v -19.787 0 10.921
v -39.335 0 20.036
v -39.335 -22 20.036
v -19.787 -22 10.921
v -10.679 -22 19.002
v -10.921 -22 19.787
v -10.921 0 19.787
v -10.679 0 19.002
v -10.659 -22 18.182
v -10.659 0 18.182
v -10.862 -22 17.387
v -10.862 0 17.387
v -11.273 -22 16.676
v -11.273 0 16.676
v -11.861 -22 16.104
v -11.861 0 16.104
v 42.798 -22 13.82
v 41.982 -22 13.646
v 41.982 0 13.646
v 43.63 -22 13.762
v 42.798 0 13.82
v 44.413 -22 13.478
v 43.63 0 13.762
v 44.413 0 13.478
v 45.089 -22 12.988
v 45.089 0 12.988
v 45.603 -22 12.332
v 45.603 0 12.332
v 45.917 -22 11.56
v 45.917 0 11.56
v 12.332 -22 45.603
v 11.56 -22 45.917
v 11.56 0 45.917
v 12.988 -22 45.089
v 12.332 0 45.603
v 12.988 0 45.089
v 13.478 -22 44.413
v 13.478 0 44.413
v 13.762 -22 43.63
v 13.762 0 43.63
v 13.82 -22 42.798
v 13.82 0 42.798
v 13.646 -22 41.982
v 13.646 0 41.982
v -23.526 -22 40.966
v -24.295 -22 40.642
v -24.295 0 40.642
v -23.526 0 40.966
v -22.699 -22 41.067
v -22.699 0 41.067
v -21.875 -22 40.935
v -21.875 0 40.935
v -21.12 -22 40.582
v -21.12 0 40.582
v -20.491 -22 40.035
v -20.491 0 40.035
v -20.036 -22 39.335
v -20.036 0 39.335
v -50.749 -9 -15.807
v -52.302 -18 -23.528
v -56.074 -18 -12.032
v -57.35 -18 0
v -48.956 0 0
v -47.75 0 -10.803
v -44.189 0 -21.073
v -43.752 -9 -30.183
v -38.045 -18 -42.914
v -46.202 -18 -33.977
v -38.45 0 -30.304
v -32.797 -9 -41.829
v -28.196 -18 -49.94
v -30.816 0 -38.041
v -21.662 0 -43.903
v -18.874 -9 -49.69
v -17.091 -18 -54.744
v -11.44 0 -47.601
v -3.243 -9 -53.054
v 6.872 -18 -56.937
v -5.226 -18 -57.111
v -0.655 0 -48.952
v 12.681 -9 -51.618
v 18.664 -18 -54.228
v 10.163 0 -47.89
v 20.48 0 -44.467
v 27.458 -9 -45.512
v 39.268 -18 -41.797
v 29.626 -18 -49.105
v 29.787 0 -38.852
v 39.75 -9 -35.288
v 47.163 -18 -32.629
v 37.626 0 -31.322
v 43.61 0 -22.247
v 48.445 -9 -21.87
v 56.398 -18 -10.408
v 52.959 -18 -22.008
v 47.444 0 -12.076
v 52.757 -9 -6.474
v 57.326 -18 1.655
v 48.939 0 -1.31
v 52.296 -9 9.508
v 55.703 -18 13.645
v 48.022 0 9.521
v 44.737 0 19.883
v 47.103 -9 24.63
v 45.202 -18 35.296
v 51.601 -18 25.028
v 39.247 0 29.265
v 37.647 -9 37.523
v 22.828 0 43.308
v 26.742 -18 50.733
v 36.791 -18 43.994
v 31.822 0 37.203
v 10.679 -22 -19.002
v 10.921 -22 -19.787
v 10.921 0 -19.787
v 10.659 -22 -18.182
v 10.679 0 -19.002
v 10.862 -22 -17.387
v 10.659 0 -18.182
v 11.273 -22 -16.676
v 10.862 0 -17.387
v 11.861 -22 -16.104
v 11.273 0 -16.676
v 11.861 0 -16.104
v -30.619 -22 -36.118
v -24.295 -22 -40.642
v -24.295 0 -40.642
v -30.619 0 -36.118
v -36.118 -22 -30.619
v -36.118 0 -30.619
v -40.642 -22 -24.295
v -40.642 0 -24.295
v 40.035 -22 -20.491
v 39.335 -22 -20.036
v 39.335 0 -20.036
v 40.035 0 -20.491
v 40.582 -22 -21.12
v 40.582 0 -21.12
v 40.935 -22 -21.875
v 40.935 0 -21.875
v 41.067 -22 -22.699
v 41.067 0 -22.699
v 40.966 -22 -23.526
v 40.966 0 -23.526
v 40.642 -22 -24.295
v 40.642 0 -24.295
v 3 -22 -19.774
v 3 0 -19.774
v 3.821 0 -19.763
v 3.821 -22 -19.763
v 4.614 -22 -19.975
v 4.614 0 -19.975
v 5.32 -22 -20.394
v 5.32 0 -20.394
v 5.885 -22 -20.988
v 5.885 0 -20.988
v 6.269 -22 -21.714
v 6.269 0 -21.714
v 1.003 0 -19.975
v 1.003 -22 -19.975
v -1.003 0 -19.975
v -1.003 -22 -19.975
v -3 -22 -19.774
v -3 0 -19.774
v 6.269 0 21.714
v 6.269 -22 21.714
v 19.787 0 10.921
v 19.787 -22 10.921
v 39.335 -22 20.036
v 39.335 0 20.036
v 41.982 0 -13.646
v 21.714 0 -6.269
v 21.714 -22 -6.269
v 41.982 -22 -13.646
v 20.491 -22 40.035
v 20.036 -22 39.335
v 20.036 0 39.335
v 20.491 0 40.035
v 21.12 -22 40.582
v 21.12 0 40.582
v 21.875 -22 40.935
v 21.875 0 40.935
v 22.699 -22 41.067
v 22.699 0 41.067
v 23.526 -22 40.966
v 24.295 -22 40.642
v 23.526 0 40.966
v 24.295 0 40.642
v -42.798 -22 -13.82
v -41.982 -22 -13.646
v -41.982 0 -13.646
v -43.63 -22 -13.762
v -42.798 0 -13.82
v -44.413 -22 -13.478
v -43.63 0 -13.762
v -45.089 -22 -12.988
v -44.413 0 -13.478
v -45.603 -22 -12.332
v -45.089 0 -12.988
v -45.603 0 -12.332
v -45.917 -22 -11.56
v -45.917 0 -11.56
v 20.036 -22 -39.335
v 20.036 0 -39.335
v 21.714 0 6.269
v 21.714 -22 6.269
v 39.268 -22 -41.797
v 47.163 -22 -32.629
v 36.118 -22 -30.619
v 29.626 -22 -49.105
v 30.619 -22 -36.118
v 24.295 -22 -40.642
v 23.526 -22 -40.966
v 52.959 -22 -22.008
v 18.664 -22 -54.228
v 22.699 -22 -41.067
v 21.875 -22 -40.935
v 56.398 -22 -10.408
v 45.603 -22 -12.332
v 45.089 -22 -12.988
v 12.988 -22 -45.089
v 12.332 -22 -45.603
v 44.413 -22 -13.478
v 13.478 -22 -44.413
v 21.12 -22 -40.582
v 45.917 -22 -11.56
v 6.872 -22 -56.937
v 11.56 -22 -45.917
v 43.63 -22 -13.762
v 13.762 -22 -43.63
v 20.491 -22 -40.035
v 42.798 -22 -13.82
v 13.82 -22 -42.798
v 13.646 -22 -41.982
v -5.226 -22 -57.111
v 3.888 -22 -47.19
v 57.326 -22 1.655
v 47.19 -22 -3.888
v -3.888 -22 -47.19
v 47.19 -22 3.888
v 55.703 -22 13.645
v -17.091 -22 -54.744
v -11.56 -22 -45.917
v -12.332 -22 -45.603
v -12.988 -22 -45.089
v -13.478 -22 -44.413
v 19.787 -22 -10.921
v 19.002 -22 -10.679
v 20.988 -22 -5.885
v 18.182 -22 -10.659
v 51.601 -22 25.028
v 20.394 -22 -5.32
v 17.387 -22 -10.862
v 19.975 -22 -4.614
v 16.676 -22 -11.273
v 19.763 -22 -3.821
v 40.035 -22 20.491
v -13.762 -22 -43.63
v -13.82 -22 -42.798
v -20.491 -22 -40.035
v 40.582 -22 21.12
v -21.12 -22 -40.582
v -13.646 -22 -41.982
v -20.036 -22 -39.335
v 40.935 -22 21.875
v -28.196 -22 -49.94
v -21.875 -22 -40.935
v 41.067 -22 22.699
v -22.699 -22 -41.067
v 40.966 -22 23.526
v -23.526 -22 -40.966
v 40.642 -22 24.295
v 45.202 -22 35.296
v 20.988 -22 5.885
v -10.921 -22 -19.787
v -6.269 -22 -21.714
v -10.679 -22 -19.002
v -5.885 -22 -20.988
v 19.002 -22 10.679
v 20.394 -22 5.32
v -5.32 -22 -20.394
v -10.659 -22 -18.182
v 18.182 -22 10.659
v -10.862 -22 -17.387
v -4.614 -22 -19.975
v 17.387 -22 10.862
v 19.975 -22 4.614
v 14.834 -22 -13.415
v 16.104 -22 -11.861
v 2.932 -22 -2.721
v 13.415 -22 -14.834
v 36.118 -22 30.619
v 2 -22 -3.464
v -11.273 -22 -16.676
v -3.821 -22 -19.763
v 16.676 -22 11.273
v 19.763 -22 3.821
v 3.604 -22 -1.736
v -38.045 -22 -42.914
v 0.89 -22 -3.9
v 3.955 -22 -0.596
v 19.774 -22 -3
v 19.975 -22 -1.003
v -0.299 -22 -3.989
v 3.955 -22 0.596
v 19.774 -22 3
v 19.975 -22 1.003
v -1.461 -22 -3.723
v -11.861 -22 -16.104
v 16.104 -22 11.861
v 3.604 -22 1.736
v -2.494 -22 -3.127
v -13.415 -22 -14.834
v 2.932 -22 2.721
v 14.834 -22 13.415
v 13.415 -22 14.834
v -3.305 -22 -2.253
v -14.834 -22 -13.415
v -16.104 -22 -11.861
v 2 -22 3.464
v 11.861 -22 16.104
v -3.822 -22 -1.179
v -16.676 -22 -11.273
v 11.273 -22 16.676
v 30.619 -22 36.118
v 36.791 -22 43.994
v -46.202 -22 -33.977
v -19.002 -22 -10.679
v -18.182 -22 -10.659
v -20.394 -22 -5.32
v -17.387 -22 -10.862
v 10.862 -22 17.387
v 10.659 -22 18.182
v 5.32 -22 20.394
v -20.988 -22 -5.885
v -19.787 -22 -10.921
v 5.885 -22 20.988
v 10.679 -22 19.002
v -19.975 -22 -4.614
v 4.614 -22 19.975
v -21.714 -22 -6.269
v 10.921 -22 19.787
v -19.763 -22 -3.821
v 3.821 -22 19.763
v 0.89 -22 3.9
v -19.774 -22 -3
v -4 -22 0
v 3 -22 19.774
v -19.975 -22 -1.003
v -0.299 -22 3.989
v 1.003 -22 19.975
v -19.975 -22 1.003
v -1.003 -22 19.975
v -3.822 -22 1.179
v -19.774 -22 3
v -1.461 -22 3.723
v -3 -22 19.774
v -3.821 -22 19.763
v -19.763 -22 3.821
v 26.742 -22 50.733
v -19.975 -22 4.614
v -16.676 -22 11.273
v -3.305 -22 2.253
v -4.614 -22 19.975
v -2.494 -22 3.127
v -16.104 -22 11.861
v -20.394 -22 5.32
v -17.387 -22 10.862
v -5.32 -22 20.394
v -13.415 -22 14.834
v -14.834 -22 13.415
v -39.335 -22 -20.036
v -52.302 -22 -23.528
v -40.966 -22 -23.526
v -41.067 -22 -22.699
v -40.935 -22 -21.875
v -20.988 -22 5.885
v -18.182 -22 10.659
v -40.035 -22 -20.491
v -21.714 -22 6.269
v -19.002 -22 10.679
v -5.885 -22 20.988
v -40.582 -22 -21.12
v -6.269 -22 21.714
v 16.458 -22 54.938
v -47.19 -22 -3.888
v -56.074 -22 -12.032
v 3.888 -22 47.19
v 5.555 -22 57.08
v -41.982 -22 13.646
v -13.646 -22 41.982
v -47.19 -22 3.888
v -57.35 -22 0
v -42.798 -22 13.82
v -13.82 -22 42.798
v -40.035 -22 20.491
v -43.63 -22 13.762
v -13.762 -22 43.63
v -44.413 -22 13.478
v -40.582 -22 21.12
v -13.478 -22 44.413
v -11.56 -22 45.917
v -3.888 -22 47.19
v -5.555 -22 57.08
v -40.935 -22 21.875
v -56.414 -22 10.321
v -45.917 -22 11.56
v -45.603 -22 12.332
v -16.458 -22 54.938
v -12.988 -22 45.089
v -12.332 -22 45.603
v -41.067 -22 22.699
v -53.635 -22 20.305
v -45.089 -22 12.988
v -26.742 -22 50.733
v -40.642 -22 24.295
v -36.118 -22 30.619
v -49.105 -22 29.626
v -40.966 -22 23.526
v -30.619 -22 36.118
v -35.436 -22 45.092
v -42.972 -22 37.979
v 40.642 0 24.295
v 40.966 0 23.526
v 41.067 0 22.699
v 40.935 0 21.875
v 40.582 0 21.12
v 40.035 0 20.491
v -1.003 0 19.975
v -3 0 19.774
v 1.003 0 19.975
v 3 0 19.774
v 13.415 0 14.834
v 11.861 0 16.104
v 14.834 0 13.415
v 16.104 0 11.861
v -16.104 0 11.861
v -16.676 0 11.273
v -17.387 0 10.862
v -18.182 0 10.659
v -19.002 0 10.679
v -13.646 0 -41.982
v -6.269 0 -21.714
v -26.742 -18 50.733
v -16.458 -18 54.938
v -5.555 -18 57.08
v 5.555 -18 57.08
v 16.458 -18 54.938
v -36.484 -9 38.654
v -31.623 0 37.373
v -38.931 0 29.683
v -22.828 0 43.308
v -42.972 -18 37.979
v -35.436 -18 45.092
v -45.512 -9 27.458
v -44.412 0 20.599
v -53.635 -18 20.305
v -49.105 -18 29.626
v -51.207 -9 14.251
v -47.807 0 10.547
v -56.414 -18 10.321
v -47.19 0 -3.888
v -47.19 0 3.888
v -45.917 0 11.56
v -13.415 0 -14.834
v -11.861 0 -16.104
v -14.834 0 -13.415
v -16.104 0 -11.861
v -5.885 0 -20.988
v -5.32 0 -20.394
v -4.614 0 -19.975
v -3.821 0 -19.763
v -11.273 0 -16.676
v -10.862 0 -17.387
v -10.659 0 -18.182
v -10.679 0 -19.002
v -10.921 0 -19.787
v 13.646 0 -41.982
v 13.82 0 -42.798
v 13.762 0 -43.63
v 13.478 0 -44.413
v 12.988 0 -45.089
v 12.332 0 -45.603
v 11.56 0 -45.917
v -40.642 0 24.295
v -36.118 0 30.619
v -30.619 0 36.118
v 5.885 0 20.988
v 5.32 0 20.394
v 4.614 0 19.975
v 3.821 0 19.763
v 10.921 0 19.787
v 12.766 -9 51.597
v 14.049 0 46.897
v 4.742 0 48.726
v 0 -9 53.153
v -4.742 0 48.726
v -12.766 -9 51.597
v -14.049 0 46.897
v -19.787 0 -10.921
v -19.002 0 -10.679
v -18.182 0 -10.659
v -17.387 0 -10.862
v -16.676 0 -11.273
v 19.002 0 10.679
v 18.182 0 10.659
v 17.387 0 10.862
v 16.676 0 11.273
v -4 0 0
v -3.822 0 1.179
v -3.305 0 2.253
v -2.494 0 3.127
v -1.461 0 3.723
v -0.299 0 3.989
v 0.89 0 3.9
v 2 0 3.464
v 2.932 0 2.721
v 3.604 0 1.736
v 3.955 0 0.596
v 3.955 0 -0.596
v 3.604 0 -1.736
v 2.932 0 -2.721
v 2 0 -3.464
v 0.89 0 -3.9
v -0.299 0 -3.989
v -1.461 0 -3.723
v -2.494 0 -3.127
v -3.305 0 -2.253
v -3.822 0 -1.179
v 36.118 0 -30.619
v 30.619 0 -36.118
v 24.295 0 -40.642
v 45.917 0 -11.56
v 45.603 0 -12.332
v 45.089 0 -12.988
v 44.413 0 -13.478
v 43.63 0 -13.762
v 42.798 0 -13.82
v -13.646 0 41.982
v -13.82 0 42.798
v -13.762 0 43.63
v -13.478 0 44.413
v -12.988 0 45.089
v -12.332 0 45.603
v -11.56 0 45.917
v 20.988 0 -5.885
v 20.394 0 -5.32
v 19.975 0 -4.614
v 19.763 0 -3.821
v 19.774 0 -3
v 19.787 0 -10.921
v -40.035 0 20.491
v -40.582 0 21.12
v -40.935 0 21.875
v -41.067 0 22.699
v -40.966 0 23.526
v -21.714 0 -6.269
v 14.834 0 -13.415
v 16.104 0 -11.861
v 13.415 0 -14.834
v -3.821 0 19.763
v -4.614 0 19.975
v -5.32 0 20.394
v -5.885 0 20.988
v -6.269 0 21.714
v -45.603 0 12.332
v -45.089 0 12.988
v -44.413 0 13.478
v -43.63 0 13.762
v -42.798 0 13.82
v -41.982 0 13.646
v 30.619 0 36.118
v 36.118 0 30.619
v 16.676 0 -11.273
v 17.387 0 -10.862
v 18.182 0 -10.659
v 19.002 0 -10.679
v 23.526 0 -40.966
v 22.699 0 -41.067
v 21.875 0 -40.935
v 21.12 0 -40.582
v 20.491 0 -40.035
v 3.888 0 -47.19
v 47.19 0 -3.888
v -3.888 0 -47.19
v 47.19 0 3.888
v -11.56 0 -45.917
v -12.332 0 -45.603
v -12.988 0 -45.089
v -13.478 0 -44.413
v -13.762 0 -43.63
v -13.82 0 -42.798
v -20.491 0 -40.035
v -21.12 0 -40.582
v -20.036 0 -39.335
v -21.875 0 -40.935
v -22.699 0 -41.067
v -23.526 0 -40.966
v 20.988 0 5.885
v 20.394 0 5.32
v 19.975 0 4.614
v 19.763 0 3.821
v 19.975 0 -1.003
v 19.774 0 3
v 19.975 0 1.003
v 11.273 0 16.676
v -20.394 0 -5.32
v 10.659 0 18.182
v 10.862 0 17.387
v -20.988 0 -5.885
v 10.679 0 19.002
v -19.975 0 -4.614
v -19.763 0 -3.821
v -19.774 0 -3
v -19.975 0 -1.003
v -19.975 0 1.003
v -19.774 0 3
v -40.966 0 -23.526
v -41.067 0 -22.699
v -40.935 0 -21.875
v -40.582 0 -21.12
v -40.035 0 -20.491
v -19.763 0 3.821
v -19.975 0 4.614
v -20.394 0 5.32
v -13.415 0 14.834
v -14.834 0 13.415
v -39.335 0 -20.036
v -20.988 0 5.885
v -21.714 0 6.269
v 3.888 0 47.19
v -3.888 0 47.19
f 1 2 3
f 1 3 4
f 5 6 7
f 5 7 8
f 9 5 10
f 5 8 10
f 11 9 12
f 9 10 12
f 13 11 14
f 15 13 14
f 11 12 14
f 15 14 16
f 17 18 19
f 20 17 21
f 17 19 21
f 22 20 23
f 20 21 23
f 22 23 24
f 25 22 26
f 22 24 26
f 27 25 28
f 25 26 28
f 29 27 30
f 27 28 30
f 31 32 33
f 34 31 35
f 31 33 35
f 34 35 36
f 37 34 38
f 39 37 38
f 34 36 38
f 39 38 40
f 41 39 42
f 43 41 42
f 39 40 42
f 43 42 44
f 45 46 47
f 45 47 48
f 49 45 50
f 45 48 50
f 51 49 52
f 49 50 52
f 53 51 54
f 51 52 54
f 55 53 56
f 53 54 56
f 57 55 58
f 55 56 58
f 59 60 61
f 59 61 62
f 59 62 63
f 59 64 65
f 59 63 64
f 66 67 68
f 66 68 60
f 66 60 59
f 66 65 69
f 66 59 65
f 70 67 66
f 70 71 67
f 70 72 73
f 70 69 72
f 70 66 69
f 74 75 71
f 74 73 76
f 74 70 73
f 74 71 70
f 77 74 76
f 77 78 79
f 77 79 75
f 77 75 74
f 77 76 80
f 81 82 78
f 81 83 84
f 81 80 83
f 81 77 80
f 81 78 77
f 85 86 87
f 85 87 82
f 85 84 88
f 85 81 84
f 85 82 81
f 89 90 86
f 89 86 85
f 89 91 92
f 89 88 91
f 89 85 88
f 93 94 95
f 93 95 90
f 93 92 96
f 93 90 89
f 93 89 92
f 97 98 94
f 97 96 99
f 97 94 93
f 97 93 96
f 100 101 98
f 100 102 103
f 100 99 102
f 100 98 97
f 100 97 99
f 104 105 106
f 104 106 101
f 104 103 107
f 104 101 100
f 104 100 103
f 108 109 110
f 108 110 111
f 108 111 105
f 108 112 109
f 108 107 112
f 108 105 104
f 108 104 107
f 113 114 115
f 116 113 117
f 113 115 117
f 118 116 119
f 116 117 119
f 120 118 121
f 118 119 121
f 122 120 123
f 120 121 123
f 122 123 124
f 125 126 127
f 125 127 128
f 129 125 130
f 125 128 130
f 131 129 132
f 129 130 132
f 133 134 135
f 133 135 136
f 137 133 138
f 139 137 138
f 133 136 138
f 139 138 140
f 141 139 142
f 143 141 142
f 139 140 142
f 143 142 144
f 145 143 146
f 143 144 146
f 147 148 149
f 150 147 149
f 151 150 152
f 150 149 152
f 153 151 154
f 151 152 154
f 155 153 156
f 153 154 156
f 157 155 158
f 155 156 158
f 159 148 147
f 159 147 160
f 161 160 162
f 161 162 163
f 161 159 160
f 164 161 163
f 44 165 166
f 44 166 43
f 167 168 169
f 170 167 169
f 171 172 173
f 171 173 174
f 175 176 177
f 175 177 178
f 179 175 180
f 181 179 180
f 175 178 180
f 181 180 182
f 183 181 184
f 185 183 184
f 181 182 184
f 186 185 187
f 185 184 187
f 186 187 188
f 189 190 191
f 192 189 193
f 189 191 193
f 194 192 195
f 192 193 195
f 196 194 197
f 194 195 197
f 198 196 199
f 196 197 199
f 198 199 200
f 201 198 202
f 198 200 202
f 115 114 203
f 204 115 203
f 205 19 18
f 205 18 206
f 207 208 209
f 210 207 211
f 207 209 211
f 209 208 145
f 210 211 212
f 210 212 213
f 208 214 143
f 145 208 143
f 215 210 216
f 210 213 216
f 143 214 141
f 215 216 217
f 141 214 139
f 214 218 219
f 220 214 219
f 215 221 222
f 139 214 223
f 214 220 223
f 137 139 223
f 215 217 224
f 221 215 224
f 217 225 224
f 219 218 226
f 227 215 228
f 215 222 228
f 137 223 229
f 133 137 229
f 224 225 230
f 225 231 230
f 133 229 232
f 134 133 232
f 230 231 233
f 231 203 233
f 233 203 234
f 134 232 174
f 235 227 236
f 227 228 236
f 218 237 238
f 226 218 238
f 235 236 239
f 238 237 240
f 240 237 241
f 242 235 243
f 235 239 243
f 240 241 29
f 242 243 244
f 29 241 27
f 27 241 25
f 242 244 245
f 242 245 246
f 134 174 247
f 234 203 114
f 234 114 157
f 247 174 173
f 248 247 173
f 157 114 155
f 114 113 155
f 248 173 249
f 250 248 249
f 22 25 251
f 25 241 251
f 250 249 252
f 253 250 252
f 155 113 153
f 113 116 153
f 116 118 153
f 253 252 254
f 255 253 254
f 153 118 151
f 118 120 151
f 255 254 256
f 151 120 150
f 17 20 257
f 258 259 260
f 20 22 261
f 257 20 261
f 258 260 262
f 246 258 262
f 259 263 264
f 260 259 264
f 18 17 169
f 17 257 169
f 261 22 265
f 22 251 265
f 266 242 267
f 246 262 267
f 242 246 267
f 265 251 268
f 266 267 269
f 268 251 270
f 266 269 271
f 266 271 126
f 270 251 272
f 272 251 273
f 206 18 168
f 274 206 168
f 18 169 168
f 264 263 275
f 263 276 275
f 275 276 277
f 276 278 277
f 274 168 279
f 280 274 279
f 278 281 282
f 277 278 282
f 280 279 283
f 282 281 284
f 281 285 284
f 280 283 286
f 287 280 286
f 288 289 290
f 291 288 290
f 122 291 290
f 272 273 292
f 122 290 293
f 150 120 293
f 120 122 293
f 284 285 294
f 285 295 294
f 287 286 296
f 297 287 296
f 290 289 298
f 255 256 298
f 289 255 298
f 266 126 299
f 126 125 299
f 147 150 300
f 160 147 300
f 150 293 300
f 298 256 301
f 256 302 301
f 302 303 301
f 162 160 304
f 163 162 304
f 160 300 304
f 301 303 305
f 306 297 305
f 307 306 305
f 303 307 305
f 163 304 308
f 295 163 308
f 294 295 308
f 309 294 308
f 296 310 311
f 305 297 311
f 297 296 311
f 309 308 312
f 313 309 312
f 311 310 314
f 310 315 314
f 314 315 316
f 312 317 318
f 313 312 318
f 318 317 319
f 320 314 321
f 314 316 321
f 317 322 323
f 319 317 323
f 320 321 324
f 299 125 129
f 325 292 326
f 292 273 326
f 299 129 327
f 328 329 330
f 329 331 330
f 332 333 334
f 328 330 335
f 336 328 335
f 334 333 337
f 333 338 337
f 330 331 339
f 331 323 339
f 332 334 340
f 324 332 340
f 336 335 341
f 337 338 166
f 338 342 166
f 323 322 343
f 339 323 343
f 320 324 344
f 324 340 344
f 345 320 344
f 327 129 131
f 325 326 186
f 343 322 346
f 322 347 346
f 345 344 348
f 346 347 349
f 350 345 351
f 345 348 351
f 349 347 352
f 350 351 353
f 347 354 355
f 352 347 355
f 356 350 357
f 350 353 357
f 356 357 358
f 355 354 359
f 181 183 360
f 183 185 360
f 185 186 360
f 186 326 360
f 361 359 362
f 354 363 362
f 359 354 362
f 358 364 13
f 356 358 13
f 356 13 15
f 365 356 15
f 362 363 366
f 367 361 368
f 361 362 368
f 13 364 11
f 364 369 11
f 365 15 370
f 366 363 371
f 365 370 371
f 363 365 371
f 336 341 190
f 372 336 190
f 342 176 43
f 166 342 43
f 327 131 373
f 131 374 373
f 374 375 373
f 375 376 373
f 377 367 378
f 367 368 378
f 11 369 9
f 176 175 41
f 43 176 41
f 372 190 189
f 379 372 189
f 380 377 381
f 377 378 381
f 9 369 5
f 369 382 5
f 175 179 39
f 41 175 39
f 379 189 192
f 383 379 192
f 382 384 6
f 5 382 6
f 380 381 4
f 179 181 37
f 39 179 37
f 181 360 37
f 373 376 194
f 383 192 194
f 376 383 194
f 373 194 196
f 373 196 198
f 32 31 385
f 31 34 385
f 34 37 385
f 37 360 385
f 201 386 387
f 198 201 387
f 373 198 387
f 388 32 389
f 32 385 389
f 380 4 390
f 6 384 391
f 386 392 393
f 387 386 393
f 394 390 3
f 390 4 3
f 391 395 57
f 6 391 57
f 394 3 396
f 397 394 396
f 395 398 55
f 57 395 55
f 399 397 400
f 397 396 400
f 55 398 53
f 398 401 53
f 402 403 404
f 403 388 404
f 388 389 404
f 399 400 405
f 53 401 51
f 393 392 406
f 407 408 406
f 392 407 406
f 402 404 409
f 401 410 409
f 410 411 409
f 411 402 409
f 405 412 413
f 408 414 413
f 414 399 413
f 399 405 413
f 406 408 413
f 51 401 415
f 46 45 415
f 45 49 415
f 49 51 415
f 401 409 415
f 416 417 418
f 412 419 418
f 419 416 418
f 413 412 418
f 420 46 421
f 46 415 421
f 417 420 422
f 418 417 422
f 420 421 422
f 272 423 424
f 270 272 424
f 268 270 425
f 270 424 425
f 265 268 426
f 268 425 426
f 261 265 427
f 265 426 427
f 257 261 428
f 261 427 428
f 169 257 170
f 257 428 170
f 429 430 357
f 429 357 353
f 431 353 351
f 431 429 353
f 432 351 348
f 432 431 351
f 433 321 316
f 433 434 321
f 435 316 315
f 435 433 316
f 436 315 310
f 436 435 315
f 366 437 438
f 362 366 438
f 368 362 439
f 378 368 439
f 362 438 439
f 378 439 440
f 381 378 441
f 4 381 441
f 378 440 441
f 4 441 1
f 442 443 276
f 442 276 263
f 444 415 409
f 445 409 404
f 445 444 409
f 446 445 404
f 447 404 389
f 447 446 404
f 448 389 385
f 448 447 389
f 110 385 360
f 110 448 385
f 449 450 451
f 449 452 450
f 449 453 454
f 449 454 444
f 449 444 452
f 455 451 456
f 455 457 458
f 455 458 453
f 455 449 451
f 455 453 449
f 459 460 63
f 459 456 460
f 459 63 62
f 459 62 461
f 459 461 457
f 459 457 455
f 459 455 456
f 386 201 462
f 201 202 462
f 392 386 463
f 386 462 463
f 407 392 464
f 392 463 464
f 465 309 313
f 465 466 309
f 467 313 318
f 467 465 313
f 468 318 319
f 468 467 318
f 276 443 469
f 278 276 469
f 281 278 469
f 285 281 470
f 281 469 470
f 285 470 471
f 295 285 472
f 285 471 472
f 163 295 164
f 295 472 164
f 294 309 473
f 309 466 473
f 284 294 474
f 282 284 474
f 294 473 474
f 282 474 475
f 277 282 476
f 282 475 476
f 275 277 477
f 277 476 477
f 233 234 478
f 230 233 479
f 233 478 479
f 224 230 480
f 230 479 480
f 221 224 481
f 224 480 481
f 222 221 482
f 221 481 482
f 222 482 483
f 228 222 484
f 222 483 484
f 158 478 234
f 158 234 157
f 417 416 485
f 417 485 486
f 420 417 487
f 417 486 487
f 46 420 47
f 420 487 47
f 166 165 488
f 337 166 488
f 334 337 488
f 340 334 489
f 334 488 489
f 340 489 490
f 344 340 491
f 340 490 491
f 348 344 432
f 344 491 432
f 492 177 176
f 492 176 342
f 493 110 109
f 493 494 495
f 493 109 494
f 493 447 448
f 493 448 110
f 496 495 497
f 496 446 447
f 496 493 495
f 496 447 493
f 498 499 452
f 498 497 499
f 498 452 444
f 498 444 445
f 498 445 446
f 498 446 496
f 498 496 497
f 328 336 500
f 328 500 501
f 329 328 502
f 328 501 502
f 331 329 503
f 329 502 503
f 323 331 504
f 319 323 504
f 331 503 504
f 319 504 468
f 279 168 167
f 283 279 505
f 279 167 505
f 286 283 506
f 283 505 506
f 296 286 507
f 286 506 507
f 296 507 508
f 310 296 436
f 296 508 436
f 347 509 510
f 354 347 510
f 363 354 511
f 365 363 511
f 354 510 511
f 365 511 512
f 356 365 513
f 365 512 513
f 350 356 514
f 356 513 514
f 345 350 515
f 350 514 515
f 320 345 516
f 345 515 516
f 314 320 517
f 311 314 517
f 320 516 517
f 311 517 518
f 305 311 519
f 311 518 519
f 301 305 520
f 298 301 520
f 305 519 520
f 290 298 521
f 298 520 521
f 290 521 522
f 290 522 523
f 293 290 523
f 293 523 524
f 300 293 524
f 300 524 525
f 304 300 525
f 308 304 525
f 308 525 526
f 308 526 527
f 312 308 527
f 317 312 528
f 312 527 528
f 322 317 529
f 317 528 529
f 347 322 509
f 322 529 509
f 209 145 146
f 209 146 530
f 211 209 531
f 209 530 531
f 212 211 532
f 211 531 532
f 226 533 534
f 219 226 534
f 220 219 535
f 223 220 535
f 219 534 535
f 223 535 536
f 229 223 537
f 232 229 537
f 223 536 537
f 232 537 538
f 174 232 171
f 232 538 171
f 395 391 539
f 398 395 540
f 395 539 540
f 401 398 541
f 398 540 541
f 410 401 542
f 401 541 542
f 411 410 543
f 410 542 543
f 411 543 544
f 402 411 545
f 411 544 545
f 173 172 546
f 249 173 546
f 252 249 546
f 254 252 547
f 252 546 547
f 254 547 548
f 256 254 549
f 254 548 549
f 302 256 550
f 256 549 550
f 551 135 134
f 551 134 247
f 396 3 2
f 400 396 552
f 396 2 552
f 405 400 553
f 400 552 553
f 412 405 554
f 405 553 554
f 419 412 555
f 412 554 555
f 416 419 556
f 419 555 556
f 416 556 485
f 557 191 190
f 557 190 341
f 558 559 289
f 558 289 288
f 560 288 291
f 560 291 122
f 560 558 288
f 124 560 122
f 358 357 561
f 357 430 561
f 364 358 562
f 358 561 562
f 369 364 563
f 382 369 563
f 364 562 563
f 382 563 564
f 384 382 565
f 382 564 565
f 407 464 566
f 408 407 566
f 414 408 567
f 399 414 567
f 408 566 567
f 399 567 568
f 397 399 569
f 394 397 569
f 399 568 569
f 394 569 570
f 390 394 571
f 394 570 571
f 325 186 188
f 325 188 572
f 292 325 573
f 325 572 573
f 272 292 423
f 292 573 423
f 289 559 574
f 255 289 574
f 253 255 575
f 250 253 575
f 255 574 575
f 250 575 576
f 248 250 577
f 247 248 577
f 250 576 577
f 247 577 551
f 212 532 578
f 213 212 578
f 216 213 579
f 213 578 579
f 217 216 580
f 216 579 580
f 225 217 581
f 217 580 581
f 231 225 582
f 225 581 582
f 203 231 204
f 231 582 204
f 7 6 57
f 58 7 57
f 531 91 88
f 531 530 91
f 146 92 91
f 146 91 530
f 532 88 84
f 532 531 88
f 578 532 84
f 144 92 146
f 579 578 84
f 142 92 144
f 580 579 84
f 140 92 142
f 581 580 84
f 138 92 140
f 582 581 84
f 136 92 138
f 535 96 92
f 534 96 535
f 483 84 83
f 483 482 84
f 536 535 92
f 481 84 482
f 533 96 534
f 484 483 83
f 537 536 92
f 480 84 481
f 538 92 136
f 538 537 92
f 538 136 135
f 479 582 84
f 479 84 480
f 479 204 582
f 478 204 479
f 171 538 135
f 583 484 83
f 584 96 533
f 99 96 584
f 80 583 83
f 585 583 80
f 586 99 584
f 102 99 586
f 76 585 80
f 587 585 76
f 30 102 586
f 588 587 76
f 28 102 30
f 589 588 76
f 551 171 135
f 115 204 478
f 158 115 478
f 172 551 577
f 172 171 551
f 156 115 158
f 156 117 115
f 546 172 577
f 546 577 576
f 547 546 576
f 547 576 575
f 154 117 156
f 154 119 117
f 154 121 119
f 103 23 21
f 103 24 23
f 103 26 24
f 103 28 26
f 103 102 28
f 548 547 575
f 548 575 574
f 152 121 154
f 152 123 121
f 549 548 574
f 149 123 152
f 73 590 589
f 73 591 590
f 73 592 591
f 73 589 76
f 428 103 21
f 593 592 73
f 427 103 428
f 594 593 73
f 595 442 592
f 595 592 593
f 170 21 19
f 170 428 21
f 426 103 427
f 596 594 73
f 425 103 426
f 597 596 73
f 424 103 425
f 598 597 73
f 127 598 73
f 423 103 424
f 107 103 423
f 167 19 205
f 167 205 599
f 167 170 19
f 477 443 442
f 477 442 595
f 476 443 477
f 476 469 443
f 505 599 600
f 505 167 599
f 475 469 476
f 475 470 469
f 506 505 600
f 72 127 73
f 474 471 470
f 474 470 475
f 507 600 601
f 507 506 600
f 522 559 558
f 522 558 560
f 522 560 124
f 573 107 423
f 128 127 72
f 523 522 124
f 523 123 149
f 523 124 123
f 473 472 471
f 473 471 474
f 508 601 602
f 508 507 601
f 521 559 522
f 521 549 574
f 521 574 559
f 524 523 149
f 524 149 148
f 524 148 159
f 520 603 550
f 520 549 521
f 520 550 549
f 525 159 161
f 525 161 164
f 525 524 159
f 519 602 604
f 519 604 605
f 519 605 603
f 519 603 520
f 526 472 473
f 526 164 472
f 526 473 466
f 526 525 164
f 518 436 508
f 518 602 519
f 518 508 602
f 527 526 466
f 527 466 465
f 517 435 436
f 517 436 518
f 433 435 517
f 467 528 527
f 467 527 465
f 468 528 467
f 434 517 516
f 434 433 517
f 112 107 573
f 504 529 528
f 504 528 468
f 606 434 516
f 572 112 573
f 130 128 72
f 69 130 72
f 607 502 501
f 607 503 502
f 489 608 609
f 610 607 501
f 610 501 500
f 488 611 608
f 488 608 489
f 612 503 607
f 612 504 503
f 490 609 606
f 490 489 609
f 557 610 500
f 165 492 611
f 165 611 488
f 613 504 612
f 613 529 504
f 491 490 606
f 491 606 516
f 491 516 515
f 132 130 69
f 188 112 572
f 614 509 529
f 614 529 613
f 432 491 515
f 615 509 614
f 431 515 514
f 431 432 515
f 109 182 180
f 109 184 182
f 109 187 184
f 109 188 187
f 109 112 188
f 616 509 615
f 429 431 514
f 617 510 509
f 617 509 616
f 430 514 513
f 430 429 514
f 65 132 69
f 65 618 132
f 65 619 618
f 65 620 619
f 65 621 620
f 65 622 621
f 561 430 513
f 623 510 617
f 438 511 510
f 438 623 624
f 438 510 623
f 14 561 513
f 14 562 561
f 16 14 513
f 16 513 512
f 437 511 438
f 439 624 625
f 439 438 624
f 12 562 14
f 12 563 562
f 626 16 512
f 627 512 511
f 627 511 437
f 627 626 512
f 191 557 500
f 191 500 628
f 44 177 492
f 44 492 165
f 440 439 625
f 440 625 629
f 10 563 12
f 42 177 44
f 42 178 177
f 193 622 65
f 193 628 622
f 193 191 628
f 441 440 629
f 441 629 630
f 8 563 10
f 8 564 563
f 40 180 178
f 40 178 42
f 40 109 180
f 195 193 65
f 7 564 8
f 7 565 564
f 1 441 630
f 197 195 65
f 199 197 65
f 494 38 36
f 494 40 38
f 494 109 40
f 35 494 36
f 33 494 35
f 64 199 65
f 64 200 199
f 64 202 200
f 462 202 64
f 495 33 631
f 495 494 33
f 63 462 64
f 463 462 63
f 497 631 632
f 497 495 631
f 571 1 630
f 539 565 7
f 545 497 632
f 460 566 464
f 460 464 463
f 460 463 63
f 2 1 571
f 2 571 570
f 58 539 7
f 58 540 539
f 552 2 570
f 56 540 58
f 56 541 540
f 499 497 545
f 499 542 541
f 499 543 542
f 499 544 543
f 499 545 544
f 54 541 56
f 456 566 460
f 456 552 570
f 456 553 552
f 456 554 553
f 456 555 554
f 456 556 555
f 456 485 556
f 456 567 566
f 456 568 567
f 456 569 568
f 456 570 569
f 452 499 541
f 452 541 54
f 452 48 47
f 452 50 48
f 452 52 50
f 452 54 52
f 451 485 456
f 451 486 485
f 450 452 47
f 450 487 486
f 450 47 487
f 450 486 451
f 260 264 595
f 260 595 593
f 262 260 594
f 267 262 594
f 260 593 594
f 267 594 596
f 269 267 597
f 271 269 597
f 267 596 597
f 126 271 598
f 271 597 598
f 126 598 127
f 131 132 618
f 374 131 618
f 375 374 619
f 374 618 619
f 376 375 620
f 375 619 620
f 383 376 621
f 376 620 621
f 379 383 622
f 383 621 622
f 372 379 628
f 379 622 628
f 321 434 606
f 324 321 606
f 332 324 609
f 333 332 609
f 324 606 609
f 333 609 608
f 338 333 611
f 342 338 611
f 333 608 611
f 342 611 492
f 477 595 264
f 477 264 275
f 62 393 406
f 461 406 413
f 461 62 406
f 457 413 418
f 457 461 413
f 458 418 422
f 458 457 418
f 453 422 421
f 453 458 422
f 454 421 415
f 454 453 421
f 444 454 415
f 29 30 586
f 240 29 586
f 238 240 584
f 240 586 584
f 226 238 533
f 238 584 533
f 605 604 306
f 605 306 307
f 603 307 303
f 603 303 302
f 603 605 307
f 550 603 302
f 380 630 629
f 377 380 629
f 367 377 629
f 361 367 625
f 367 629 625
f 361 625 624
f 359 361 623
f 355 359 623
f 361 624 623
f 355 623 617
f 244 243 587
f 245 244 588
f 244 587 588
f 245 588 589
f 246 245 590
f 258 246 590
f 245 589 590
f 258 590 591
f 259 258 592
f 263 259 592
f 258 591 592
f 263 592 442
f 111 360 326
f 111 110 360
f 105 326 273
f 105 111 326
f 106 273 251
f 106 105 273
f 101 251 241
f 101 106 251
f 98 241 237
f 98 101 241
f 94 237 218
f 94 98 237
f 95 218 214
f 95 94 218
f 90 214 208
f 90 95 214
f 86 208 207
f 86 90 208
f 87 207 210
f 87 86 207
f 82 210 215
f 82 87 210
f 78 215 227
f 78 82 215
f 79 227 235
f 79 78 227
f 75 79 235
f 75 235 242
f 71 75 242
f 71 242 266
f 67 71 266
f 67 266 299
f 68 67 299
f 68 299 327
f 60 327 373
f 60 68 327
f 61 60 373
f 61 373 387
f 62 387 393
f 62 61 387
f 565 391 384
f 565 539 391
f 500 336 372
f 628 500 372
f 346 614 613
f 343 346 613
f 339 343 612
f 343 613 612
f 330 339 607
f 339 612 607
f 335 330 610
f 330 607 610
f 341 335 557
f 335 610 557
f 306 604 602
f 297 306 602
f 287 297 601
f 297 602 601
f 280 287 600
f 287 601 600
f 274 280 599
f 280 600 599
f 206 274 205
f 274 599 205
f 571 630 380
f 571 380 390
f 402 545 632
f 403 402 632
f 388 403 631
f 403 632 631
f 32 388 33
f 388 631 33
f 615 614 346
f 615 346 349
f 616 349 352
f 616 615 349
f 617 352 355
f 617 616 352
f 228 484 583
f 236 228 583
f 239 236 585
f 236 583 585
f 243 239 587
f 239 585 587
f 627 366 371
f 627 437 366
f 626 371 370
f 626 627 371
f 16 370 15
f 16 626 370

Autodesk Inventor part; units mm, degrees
ref_plane "YZ Plane" through (0, 0, 0) normal (1, 0, 0) x (0, 1, 0)
ref_plane "XZ Plane" through (0, 0, 0) normal (0, 1, 0) x (-1, 0, 0)
ref_plane "XY Plane" through (0, 0, 0) normal (0, 0, 1) x (1, 0, 0)
sketch "Esquisse1" plane through (0, 0, 0) normal (0, 1, 0) x (-1, 0, 0)
  arc A0 (26.7424, 50.7333) -> (-26.7424, 50.7333) centre (0, 0) ccw
  circle A1 centre (0, 0) radius 57.35
  line L0 (0, -80.29) -> (0, 80.29) construction
  line L1 (-80.29, 0) -> (80.29, 0) construction
  circle A2 centre (0, 0) radius 4
  line L2 (-6.2691, 21.7137) -> (-13.6461, 41.982)
  line L3 (13.6461, 41.982) -> (6.2691, 21.7137)
  arc A3 (11.5595, 45.9173) -> (-11.5595, 45.9173) centre (0, 0) ccw
  arc A4 (-11.5595, 45.9173) -> (-13.6461, 41.982) centre (-10.8271, 43.0081) ccw
  arc A5 (13.6461, 41.982) -> (11.5595, 45.9173) centre (10.8271, 43.0081) ccw
  circle A6 centre (0, 0) radius 16 construction
  circle A7 centre (0, 0) radius 57.35 construction
  arc A8 (3, 19.7737) -> (-3, 19.7737) centre (0, 0) ccw
  arc A9 (-6.2691, 21.7137) -> (-3, 19.7737) centre (-3.45, 22.7398) ccw
  arc A10 (3, 19.7737) -> (6.2691, 21.7137) centre (3.45, 22.7398) ccw
  line L4 (-19.7868, 10.921) -> (-39.3351, 20.0365)
  line L5 (-20.0365, 39.3351) -> (-10.921, 19.7868)
  arc A11 (-24.2947, 40.6422) -> (-40.6422, 24.2947) centre (0, 0) ccw
  arc A12 (-40.6422, 24.2947) -> (-39.3351, 20.0365) centre (-38.0672, 22.7554) ccw
  arc A13 (-20.0365, 39.3351) -> (-24.2947, 40.6422) centre (-22.7554, 38.0672) ccw
  arc A14 (-11.8608, 16.1035) -> (-16.1035, 11.8608) centre (0, 0) ccw
  arc A15 (-19.7868, 10.921) -> (-16.1035, 11.8608) centre (-18.519, 13.6399) ccw
  arc A16 (-11.8608, 16.1035) -> (-10.921, 19.7868) centre (-13.6399, 18.519) ccw
  line L6 (-21.7137, -6.2691) -> (-41.982, -13.6461)
  line L7 (-41.982, 13.6461) -> (-21.7137, 6.2691)
  arc A17 (-45.9173, 11.5595) -> (-45.9173, -11.5595) centre (0, 0) ccw
  arc A18 (-45.9173, -11.5595) -> (-41.982, -13.6461) centre (-43.0081, -10.8271) ccw
  arc A19 (-41.982, 13.6461) -> (-45.9173, 11.5595) centre (-43.0081, 10.8271) ccw
  arc A20 (-19.7737, 3) -> (-19.7737, -3) centre (0, 0) ccw
  arc A21 (-21.7137, -6.2691) -> (-19.7737, -3) centre (-22.7398, -3.45) ccw
  arc A22 (-19.7737, 3) -> (-21.7137, 6.2691) centre (-22.7398, 3.45) ccw
  line L8 (-10.921, -19.7868) -> (-20.0365, -39.3351)
  line L9 (-39.3351, -20.0365) -> (-19.7868, -10.921)
  arc A23 (-40.6422, -24.2947) -> (-24.2947, -40.6422) centre (0, 0) ccw
  arc A24 (-24.2947, -40.6422) -> (-20.0365, -39.3351) centre (-22.7554, -38.0672) ccw
  arc A25 (-39.3351, -20.0365) -> (-40.6422, -24.2947) centre (-38.0672, -22.7554) ccw
  arc A26 (-16.1035, -11.8608) -> (-11.8608, -16.1035) centre (0, 0) ccw
  arc A27 (-10.921, -19.7868) -> (-11.8608, -16.1035) centre (-13.6399, -18.519) ccw
  arc A28 (-16.1035, -11.8608) -> (-19.7868, -10.921) centre (-18.519, -13.6399) ccw
  line L10 (6.2691, -21.7137) -> (13.6461, -41.982)
  line L11 (-13.6461, -41.982) -> (-6.2691, -21.7137)
  arc A29 (-11.5595, -45.9173) -> (11.5595, -45.9173) centre (0, 0) ccw
  arc A30 (11.5595, -45.9173) -> (13.6461, -41.982) centre (10.8271, -43.0081) ccw
  arc A31 (-13.6461, -41.982) -> (-11.5595, -45.9173) centre (-10.8271, -43.0081) ccw
  arc A32 (-3, -19.7737) -> (3, -19.7737) centre (0, 0) ccw
  arc A33 (6.2691, -21.7137) -> (3, -19.7737) centre (3.45, -22.7398) ccw
  arc A34 (-3, -19.7737) -> (-6.2691, -21.7137) centre (-3.45, -22.7398) ccw
  line L12 (19.7868, -10.921) -> (39.3351, -20.0365)
  line L13 (20.0365, -39.3351) -> (10.921, -19.7868)
  arc A35 (24.2947, -40.6422) -> (40.6422, -24.2947) centre (0, 0) ccw
  arc A36 (40.6422, -24.2947) -> (39.3351, -20.0365) centre (38.0672, -22.7554) ccw
  arc A37 (20.0365, -39.3351) -> (24.2947, -40.6422) centre (22.7554, -38.0672) ccw
  arc A38 (11.8608, -16.1035) -> (16.1035, -11.8608) centre (0, 0) ccw
  arc A39 (19.7868, -10.921) -> (16.1035, -11.8608) centre (18.519, -13.6399) ccw
  arc A40 (11.8608, -16.1035) -> (10.921, -19.7868) centre (13.6399, -18.519) ccw
  line L14 (21.7137, 6.2691) -> (41.982, 13.6461)
  line L15 (41.982, -13.6461) -> (21.7137, -6.2691)
  arc A41 (45.9173, -11.5595) -> (45.9173, 11.5595) centre (0, 0) ccw
  arc A42 (45.9173, 11.5595) -> (41.982, 13.6461) centre (43.0081, 10.8271) ccw
  arc A43 (41.982, -13.6461) -> (45.9173, -11.5595) centre (43.0081, -10.8271) ccw
  arc A44 (19.7737, -3) -> (19.7737, 3) centre (0, 0) ccw
  arc A45 (21.7137, 6.2691) -> (19.7737, 3) centre (22.7398, 3.45) ccw
  arc A46 (19.7737, -3) -> (21.7137, -6.2691) centre (22.7398, -3.45) ccw
  line L16 (10.921, 19.7868) -> (20.0365, 39.3351)
  line L17 (39.3351, 20.0365) -> (19.7868, 10.921)
  arc A47 (40.6422, 24.2947) -> (24.2947, 40.6422) centre (0, 0) ccw
  arc A48 (24.2947, 40.6422) -> (20.0365, 39.3351) centre (22.7554, 38.0672) ccw
  arc A49 (39.3351, 20.0365) -> (40.6422, 24.2947) centre (38.0672, 22.7554) ccw
  arc A50 (16.1035, 11.8608) -> (11.8608, 16.1035) centre (0, 0) ccw
  arc A51 (10.921, 19.7868) -> (11.8608, 16.1035) centre (13.6399, 18.519) ccw
  arc A52 (16.1035, 11.8608) -> (19.7868, 10.921) centre (18.519, 13.6399) ccw
  point P0 (0, 0)
  point P1 (-14.7432, 44.9962)
  point P2 (14.7432, 44.9962)
  point P3 (5.3773, 19.2636)
  point P4 (-5.3773, 19.2636)
  point P5 (-42.2422, 21.3921)
  point P6 (-21.3921, 42.2422)
  point P7 (-9.8191, 17.4237)
  point P8 (-17.4237, 9.8191)
  point P9 (-44.9962, -14.7432)
  point P10 (-44.9962, 14.7432)
  point P11 (-19.2636, 5.3773)
  point P12 (-19.2636, -5.3773)
  point P13 (-21.3921, -42.2422)
  point P14 (-42.2422, -21.3921)
  point P15 (-17.4237, -9.8191)
  point P16 (-9.8191, -17.4237)
  point P17 (14.7432, -44.9962)
  point P18 (-14.7432, -44.9962)
  point P19 (-5.3773, -19.2636)
  point P20 (5.3773, -19.2636)
  point P21 (42.2422, -21.3921)
  point P22 (21.3921, -42.2422)
  point P23 (9.8191, -17.4237)
  point P24 (17.4237, -9.8191)
  point P25 (44.9962, 14.7432)
  point P26 (44.9962, -14.7432)
  point P27 (19.2636, -5.3773)
  point P28 (19.2636, 5.3773)
  point P29 (21.3921, 42.2422)
  point P30 (42.2422, 21.3921)
  point P31 (17.4237, 9.8191)
  point P32 (9.8191, 17.4237)
  dimension "d0" = 8
  dimension "d2" = 3
  dimension "d3" = 10
  dimension "d5" = 40
  dimension "d15" = 20
  dimension "d16" = 3
  dimension "d17" = 6
  dimension "d20" = 360
extrude "Extrusion1" add sketch "Esquisse1" against normal blind 22
chamfer "Chanfrein1" distance 18 angle 25 1 edges at (57.35, 0, 0) measured on face at (-31.6781, -14.6667, -47.8071)
properties part number "Colossus_7kW_Rotor"
